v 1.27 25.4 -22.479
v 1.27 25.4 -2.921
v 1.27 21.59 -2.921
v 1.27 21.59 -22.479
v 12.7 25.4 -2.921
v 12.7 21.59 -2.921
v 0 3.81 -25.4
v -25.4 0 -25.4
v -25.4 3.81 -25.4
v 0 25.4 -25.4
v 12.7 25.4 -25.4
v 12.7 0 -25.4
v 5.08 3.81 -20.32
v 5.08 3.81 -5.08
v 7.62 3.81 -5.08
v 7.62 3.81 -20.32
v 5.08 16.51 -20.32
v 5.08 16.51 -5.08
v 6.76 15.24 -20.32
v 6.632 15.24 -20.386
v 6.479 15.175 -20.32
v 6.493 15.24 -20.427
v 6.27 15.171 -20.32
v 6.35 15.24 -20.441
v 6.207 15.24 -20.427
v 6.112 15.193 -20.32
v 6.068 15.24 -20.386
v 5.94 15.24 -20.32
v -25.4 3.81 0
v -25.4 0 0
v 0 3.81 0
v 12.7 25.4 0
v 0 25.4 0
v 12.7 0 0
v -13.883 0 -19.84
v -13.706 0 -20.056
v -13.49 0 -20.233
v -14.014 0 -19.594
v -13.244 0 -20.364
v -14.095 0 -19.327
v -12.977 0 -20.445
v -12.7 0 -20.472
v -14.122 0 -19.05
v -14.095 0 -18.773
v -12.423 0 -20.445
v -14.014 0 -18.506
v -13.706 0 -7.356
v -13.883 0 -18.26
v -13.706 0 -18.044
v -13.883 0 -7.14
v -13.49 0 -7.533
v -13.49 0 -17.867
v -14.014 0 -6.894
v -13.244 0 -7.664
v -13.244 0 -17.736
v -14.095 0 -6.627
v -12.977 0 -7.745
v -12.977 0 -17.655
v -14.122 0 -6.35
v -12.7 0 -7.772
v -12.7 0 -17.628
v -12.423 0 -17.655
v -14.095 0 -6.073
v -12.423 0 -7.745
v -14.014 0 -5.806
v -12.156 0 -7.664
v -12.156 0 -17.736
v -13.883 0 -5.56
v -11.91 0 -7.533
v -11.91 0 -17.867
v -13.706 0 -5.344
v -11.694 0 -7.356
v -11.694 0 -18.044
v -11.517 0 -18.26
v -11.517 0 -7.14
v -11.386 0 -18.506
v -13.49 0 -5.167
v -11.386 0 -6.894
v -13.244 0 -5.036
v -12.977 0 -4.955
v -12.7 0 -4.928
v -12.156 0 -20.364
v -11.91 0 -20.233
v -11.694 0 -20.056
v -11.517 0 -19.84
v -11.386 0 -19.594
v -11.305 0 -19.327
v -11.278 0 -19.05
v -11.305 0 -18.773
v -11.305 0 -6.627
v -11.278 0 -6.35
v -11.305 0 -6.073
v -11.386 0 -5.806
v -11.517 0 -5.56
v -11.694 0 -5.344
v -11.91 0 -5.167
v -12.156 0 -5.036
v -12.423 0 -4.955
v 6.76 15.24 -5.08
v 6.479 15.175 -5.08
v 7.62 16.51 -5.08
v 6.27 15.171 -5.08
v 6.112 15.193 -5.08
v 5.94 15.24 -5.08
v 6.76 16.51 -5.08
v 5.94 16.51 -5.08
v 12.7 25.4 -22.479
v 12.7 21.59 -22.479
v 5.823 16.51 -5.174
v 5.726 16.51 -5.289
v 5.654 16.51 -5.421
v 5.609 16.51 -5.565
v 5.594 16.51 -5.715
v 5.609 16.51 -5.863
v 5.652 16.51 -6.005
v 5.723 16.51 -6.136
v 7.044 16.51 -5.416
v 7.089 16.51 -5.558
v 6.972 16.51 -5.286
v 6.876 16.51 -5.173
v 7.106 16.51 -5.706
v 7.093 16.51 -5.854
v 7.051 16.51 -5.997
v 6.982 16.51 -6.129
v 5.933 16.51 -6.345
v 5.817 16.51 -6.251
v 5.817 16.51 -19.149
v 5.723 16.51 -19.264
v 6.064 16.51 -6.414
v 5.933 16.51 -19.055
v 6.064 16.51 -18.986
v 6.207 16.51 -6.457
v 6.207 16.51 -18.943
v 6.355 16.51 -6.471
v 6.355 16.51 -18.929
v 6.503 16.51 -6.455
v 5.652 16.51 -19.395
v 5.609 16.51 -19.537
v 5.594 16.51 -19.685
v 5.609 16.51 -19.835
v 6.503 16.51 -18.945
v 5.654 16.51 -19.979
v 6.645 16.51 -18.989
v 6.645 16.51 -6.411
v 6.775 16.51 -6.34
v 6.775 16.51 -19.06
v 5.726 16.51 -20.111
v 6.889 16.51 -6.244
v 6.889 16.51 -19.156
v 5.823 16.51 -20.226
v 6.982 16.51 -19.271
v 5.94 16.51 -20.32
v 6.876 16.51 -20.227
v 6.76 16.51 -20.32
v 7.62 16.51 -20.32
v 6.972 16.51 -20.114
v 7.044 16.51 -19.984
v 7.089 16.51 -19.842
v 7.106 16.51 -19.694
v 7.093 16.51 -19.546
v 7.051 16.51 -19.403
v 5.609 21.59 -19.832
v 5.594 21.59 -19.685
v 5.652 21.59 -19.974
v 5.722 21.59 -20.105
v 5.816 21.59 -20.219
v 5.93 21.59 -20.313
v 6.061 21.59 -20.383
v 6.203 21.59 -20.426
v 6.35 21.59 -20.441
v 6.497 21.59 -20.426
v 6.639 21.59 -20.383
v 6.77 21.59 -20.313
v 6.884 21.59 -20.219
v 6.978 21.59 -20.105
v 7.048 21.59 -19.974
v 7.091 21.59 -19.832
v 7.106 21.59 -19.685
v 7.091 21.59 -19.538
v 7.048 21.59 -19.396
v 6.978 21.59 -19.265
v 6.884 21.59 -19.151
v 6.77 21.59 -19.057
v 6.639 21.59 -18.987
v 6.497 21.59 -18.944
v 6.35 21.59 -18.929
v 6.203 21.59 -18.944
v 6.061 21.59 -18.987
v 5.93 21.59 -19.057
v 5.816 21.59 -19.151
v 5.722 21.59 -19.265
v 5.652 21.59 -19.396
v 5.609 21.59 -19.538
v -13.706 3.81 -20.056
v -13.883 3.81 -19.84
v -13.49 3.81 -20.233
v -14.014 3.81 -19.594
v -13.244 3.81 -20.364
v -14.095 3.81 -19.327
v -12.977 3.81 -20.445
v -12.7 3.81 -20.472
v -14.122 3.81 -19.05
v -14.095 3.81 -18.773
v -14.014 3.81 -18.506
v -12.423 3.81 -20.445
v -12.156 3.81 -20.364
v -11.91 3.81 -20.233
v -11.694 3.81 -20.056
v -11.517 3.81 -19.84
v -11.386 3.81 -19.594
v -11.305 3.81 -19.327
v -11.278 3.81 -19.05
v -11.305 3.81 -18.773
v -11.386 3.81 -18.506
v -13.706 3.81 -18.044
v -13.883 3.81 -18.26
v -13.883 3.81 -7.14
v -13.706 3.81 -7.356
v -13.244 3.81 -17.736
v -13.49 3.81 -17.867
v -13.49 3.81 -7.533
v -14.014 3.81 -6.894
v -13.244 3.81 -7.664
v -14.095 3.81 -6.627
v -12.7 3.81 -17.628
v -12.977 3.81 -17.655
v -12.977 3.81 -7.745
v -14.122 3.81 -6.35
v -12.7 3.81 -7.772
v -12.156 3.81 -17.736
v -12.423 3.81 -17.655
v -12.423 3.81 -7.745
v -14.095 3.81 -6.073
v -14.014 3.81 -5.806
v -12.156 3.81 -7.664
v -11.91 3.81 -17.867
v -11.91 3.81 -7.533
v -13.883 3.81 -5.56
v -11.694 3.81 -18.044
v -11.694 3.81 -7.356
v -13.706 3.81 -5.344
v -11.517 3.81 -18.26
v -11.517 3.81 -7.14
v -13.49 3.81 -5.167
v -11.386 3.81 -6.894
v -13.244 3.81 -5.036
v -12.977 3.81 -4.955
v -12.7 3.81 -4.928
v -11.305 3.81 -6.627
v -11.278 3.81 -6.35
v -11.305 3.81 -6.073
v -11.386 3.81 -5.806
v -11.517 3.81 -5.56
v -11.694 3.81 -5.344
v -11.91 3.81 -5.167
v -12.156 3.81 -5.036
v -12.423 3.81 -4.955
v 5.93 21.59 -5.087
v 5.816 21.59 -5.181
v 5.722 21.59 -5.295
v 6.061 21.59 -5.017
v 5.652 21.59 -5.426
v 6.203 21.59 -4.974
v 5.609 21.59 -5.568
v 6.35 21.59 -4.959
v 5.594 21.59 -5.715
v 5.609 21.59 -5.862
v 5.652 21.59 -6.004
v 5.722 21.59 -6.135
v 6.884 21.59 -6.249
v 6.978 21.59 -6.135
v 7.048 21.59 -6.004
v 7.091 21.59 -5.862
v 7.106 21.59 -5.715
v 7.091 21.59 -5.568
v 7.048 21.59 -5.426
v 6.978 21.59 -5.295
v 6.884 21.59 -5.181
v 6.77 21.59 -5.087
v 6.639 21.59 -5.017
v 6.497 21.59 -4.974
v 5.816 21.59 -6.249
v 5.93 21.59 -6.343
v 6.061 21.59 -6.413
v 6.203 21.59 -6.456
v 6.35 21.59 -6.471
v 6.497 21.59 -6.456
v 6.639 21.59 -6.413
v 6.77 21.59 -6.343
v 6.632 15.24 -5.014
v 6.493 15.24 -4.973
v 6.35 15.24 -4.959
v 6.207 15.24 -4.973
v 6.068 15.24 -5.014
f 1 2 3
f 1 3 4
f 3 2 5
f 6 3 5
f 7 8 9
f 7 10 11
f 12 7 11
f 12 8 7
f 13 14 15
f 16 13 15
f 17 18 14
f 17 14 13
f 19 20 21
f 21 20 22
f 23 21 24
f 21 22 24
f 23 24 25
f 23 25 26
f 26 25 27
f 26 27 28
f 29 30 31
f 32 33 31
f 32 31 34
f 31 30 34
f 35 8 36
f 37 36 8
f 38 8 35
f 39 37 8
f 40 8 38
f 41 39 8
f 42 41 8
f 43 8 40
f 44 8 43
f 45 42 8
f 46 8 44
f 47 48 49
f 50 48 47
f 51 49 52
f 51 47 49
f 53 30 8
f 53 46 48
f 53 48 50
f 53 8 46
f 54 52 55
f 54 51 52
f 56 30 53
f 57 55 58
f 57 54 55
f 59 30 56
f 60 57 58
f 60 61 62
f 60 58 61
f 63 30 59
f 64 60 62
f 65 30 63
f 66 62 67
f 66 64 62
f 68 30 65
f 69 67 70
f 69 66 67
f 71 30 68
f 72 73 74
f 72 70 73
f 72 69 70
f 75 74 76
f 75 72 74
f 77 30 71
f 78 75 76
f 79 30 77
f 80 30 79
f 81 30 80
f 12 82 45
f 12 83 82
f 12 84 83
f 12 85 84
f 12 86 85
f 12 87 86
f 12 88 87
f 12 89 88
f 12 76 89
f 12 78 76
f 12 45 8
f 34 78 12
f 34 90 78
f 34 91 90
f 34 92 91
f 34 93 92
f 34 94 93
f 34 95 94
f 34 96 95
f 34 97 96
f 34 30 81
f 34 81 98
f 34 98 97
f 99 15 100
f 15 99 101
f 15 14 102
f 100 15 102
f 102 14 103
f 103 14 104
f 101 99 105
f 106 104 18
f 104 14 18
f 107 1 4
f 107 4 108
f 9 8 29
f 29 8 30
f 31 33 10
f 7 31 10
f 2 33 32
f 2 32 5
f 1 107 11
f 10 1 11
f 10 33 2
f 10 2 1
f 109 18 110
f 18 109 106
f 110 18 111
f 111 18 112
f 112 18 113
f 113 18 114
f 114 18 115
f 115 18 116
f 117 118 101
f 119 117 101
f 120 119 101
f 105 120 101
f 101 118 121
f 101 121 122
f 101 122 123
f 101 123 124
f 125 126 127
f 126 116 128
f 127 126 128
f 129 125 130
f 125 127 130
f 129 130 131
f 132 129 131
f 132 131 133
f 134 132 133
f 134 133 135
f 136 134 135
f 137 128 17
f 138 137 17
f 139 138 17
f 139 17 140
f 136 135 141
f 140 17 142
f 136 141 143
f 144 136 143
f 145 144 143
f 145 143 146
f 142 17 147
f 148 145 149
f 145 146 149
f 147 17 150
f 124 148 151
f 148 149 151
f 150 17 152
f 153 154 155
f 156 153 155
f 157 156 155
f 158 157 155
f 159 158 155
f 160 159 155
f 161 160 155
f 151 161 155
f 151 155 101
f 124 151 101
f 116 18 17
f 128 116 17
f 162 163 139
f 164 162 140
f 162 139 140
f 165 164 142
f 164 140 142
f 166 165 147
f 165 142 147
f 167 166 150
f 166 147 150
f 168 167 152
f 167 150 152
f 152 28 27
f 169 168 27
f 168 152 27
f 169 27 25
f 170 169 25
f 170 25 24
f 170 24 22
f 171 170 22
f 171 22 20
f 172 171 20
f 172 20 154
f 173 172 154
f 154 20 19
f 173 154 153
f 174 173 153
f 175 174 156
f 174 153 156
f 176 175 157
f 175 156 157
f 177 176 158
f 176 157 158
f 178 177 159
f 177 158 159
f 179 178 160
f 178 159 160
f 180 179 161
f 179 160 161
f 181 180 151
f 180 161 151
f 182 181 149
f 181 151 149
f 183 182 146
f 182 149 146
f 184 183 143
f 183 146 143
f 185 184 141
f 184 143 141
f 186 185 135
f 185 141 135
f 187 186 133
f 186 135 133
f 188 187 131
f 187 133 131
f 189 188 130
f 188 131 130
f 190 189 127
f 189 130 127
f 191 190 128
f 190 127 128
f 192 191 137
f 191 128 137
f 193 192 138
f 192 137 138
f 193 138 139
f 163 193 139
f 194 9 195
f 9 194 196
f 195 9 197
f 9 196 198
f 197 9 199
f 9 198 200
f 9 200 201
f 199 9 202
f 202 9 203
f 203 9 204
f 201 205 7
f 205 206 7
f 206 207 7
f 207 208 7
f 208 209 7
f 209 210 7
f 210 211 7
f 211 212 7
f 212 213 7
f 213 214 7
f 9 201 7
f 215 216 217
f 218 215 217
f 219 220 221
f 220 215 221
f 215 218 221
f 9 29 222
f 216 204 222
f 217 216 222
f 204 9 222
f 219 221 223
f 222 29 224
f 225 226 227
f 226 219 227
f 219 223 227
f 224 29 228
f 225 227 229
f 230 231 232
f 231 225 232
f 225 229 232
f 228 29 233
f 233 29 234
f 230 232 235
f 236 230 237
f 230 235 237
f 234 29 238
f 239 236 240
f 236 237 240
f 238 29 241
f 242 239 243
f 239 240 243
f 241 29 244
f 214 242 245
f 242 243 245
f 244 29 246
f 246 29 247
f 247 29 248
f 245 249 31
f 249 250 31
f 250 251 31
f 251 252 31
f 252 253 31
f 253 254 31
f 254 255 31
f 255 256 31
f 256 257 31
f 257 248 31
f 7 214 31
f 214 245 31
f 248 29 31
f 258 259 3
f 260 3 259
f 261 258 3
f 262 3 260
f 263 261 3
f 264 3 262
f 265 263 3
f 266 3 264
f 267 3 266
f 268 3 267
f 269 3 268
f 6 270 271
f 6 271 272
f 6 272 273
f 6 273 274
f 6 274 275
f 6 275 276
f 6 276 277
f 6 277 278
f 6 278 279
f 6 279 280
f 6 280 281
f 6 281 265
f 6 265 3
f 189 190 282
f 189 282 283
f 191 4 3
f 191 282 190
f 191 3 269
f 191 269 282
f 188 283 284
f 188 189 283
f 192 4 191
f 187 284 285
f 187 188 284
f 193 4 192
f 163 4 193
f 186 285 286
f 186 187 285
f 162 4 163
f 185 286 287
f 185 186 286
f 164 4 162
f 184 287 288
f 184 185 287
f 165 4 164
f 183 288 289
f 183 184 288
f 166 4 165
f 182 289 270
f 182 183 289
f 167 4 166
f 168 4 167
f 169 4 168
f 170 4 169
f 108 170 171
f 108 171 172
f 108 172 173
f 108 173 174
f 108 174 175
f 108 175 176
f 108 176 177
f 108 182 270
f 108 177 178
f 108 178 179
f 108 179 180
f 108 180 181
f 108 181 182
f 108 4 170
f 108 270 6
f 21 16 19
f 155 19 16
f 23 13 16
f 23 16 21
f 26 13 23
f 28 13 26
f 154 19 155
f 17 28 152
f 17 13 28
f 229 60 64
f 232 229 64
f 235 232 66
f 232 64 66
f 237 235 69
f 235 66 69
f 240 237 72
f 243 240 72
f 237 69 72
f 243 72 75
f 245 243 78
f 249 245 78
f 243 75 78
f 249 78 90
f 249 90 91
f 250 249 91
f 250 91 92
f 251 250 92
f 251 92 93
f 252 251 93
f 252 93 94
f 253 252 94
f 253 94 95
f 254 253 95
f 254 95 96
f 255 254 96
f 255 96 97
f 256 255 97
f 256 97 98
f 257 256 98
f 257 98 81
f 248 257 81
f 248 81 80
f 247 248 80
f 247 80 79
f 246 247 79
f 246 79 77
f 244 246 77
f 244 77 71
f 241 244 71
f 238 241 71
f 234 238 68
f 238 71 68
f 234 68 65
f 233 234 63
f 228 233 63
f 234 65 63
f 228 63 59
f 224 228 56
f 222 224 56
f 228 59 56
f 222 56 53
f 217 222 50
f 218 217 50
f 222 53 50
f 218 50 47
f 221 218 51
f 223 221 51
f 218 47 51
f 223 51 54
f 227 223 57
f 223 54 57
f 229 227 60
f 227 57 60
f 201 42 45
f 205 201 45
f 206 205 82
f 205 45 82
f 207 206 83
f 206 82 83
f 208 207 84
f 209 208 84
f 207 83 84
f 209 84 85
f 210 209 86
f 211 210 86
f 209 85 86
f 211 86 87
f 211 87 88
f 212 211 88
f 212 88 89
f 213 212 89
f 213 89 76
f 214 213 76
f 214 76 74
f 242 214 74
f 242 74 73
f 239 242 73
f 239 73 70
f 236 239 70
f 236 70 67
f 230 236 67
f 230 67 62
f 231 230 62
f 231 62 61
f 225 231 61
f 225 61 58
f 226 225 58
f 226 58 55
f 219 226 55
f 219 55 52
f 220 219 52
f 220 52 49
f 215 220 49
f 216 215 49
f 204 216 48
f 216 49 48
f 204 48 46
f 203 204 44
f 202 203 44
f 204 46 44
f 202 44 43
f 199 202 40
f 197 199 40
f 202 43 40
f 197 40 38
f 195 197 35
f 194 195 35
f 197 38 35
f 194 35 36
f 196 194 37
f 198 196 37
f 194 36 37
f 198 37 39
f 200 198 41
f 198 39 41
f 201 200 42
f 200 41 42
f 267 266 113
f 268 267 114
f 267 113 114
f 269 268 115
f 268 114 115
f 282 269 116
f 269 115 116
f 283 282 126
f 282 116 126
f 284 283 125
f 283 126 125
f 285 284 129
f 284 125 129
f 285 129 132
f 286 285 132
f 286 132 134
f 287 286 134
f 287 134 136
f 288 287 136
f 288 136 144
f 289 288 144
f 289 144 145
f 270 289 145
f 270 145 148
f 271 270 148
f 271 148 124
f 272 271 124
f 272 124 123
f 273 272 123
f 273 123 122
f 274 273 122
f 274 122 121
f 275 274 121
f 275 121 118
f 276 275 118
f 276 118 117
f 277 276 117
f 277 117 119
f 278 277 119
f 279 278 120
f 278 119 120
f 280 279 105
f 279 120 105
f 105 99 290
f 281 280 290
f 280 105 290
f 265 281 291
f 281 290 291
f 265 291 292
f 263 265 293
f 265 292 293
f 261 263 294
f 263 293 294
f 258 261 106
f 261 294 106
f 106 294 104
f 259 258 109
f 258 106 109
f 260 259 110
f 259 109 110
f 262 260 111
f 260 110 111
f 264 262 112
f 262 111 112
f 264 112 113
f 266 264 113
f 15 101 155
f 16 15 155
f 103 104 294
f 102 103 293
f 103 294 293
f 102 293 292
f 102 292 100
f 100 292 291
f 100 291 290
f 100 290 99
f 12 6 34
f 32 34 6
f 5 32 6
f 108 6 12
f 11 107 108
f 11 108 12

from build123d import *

# Parameters (mm, degrees)
SKETCH1_W                 = 25.4
SKETCH1_H                 = 25.4
BOSS_EXTRUDE1_DEPTH       = 12.7
SKETCH2_W                 = 11.43
SKETCH2_H                 = 19.558
CUT_EXTRUDE1_DEPTH        = 3.81
SHELL2_T                  = -5.08
F_1_64_TAPPED_HOLE2_D     = 1.5113
F_1_64_TAPPED_HOLE2_DEPTH = 6.35
F_1_64_TAPPED_HOLE2_TIP   = 0.454040327
SKETCH12_W                = 38.1
SKETCH12_H                = 25.4
BOSS_EXTRUDE2_DEPTH       = 3.81
SKETCH16_R                = 1.4224
CUT_EXTRUDE2_DEPTH        = 44.994090512


with BuildPart() as part:
    # Sketch1 → Boss-Extrude1 (new body)
    with BuildSketch(Plane(origin=(0, 0, 0), x_dir=(0, 0, -1), z_dir=(1, 0, 0))):
        with Locations((12.7, 12.7)):
            Rectangle(SKETCH1_W, SKETCH1_H)
    extrude(amount=BOSS_EXTRUDE1_DEPTH)

    # Sketch2 → Cut-Extrude1 (cut)
    with BuildSketch(Plane(origin=(0, 25.4, 0), x_dir=(1, 0, 0), z_dir=(0, 1, 0))):
        with Locations((6.985, 12.7)):
            Rectangle(SKETCH2_W, SKETCH2_H)
    extrude(amount=-CUT_EXTRUDE1_DEPTH, mode=Mode.SUBTRACT)

    # Shell2
    shell2_openings = [part.faces().sort_by_distance(p)[0] for p in [
        (6.35, 0, -12.7),
    ]]
    offset(amount=SHELL2_T, openings=shell2_openings, kind=Kind.INTERSECTION)

    # #1-64 Tapped Hole2
    with Locations(Plane(origin=(0, 21.59, 0), x_dir=(1, 0, 0), z_dir=(0, 1, 0))):
        with Locations((6.35, 19.685), (6.35, 5.715)):
            Hole(F_1_64_TAPPED_HOLE2_D / 2, depth=F_1_64_TAPPED_HOLE2_DEPTH)
            with Locations((0, 0, -(F_1_64_TAPPED_HOLE2_DEPTH + F_1_64_TAPPED_HOLE2_TIP / 2))):  # 118° drill point
                Cone(0, F_1_64_TAPPED_HOLE2_D / 2, F_1_64_TAPPED_HOLE2_TIP, mode=Mode.SUBTRACT)

    # Sketch12 → Boss-Extrude2 (add)
    with BuildSketch(Plane.XZ):
        with Locations((-6.35, -12.7)):
            Rectangle(SKETCH12_W, SKETCH12_H)
    extrude(amount=-BOSS_EXTRUDE2_DEPTH)

    # Sketch16 → Cut-Extrude2 (cut, through all)
    with BuildSketch(Plane.XZ):
        with Locations(Location((-12.7, -6.35, 0), (0, 0, 270))):
            Circle(SKETCH16_R)
        with Locations(Location((-12.7, -19.05, 0), (0, 0, 270))):
            Circle(SKETCH16_R)
    extrude(amount=-CUT_EXTRUDE2_DEPTH, mode=Mode.SUBTRACT)


solid = part.part
